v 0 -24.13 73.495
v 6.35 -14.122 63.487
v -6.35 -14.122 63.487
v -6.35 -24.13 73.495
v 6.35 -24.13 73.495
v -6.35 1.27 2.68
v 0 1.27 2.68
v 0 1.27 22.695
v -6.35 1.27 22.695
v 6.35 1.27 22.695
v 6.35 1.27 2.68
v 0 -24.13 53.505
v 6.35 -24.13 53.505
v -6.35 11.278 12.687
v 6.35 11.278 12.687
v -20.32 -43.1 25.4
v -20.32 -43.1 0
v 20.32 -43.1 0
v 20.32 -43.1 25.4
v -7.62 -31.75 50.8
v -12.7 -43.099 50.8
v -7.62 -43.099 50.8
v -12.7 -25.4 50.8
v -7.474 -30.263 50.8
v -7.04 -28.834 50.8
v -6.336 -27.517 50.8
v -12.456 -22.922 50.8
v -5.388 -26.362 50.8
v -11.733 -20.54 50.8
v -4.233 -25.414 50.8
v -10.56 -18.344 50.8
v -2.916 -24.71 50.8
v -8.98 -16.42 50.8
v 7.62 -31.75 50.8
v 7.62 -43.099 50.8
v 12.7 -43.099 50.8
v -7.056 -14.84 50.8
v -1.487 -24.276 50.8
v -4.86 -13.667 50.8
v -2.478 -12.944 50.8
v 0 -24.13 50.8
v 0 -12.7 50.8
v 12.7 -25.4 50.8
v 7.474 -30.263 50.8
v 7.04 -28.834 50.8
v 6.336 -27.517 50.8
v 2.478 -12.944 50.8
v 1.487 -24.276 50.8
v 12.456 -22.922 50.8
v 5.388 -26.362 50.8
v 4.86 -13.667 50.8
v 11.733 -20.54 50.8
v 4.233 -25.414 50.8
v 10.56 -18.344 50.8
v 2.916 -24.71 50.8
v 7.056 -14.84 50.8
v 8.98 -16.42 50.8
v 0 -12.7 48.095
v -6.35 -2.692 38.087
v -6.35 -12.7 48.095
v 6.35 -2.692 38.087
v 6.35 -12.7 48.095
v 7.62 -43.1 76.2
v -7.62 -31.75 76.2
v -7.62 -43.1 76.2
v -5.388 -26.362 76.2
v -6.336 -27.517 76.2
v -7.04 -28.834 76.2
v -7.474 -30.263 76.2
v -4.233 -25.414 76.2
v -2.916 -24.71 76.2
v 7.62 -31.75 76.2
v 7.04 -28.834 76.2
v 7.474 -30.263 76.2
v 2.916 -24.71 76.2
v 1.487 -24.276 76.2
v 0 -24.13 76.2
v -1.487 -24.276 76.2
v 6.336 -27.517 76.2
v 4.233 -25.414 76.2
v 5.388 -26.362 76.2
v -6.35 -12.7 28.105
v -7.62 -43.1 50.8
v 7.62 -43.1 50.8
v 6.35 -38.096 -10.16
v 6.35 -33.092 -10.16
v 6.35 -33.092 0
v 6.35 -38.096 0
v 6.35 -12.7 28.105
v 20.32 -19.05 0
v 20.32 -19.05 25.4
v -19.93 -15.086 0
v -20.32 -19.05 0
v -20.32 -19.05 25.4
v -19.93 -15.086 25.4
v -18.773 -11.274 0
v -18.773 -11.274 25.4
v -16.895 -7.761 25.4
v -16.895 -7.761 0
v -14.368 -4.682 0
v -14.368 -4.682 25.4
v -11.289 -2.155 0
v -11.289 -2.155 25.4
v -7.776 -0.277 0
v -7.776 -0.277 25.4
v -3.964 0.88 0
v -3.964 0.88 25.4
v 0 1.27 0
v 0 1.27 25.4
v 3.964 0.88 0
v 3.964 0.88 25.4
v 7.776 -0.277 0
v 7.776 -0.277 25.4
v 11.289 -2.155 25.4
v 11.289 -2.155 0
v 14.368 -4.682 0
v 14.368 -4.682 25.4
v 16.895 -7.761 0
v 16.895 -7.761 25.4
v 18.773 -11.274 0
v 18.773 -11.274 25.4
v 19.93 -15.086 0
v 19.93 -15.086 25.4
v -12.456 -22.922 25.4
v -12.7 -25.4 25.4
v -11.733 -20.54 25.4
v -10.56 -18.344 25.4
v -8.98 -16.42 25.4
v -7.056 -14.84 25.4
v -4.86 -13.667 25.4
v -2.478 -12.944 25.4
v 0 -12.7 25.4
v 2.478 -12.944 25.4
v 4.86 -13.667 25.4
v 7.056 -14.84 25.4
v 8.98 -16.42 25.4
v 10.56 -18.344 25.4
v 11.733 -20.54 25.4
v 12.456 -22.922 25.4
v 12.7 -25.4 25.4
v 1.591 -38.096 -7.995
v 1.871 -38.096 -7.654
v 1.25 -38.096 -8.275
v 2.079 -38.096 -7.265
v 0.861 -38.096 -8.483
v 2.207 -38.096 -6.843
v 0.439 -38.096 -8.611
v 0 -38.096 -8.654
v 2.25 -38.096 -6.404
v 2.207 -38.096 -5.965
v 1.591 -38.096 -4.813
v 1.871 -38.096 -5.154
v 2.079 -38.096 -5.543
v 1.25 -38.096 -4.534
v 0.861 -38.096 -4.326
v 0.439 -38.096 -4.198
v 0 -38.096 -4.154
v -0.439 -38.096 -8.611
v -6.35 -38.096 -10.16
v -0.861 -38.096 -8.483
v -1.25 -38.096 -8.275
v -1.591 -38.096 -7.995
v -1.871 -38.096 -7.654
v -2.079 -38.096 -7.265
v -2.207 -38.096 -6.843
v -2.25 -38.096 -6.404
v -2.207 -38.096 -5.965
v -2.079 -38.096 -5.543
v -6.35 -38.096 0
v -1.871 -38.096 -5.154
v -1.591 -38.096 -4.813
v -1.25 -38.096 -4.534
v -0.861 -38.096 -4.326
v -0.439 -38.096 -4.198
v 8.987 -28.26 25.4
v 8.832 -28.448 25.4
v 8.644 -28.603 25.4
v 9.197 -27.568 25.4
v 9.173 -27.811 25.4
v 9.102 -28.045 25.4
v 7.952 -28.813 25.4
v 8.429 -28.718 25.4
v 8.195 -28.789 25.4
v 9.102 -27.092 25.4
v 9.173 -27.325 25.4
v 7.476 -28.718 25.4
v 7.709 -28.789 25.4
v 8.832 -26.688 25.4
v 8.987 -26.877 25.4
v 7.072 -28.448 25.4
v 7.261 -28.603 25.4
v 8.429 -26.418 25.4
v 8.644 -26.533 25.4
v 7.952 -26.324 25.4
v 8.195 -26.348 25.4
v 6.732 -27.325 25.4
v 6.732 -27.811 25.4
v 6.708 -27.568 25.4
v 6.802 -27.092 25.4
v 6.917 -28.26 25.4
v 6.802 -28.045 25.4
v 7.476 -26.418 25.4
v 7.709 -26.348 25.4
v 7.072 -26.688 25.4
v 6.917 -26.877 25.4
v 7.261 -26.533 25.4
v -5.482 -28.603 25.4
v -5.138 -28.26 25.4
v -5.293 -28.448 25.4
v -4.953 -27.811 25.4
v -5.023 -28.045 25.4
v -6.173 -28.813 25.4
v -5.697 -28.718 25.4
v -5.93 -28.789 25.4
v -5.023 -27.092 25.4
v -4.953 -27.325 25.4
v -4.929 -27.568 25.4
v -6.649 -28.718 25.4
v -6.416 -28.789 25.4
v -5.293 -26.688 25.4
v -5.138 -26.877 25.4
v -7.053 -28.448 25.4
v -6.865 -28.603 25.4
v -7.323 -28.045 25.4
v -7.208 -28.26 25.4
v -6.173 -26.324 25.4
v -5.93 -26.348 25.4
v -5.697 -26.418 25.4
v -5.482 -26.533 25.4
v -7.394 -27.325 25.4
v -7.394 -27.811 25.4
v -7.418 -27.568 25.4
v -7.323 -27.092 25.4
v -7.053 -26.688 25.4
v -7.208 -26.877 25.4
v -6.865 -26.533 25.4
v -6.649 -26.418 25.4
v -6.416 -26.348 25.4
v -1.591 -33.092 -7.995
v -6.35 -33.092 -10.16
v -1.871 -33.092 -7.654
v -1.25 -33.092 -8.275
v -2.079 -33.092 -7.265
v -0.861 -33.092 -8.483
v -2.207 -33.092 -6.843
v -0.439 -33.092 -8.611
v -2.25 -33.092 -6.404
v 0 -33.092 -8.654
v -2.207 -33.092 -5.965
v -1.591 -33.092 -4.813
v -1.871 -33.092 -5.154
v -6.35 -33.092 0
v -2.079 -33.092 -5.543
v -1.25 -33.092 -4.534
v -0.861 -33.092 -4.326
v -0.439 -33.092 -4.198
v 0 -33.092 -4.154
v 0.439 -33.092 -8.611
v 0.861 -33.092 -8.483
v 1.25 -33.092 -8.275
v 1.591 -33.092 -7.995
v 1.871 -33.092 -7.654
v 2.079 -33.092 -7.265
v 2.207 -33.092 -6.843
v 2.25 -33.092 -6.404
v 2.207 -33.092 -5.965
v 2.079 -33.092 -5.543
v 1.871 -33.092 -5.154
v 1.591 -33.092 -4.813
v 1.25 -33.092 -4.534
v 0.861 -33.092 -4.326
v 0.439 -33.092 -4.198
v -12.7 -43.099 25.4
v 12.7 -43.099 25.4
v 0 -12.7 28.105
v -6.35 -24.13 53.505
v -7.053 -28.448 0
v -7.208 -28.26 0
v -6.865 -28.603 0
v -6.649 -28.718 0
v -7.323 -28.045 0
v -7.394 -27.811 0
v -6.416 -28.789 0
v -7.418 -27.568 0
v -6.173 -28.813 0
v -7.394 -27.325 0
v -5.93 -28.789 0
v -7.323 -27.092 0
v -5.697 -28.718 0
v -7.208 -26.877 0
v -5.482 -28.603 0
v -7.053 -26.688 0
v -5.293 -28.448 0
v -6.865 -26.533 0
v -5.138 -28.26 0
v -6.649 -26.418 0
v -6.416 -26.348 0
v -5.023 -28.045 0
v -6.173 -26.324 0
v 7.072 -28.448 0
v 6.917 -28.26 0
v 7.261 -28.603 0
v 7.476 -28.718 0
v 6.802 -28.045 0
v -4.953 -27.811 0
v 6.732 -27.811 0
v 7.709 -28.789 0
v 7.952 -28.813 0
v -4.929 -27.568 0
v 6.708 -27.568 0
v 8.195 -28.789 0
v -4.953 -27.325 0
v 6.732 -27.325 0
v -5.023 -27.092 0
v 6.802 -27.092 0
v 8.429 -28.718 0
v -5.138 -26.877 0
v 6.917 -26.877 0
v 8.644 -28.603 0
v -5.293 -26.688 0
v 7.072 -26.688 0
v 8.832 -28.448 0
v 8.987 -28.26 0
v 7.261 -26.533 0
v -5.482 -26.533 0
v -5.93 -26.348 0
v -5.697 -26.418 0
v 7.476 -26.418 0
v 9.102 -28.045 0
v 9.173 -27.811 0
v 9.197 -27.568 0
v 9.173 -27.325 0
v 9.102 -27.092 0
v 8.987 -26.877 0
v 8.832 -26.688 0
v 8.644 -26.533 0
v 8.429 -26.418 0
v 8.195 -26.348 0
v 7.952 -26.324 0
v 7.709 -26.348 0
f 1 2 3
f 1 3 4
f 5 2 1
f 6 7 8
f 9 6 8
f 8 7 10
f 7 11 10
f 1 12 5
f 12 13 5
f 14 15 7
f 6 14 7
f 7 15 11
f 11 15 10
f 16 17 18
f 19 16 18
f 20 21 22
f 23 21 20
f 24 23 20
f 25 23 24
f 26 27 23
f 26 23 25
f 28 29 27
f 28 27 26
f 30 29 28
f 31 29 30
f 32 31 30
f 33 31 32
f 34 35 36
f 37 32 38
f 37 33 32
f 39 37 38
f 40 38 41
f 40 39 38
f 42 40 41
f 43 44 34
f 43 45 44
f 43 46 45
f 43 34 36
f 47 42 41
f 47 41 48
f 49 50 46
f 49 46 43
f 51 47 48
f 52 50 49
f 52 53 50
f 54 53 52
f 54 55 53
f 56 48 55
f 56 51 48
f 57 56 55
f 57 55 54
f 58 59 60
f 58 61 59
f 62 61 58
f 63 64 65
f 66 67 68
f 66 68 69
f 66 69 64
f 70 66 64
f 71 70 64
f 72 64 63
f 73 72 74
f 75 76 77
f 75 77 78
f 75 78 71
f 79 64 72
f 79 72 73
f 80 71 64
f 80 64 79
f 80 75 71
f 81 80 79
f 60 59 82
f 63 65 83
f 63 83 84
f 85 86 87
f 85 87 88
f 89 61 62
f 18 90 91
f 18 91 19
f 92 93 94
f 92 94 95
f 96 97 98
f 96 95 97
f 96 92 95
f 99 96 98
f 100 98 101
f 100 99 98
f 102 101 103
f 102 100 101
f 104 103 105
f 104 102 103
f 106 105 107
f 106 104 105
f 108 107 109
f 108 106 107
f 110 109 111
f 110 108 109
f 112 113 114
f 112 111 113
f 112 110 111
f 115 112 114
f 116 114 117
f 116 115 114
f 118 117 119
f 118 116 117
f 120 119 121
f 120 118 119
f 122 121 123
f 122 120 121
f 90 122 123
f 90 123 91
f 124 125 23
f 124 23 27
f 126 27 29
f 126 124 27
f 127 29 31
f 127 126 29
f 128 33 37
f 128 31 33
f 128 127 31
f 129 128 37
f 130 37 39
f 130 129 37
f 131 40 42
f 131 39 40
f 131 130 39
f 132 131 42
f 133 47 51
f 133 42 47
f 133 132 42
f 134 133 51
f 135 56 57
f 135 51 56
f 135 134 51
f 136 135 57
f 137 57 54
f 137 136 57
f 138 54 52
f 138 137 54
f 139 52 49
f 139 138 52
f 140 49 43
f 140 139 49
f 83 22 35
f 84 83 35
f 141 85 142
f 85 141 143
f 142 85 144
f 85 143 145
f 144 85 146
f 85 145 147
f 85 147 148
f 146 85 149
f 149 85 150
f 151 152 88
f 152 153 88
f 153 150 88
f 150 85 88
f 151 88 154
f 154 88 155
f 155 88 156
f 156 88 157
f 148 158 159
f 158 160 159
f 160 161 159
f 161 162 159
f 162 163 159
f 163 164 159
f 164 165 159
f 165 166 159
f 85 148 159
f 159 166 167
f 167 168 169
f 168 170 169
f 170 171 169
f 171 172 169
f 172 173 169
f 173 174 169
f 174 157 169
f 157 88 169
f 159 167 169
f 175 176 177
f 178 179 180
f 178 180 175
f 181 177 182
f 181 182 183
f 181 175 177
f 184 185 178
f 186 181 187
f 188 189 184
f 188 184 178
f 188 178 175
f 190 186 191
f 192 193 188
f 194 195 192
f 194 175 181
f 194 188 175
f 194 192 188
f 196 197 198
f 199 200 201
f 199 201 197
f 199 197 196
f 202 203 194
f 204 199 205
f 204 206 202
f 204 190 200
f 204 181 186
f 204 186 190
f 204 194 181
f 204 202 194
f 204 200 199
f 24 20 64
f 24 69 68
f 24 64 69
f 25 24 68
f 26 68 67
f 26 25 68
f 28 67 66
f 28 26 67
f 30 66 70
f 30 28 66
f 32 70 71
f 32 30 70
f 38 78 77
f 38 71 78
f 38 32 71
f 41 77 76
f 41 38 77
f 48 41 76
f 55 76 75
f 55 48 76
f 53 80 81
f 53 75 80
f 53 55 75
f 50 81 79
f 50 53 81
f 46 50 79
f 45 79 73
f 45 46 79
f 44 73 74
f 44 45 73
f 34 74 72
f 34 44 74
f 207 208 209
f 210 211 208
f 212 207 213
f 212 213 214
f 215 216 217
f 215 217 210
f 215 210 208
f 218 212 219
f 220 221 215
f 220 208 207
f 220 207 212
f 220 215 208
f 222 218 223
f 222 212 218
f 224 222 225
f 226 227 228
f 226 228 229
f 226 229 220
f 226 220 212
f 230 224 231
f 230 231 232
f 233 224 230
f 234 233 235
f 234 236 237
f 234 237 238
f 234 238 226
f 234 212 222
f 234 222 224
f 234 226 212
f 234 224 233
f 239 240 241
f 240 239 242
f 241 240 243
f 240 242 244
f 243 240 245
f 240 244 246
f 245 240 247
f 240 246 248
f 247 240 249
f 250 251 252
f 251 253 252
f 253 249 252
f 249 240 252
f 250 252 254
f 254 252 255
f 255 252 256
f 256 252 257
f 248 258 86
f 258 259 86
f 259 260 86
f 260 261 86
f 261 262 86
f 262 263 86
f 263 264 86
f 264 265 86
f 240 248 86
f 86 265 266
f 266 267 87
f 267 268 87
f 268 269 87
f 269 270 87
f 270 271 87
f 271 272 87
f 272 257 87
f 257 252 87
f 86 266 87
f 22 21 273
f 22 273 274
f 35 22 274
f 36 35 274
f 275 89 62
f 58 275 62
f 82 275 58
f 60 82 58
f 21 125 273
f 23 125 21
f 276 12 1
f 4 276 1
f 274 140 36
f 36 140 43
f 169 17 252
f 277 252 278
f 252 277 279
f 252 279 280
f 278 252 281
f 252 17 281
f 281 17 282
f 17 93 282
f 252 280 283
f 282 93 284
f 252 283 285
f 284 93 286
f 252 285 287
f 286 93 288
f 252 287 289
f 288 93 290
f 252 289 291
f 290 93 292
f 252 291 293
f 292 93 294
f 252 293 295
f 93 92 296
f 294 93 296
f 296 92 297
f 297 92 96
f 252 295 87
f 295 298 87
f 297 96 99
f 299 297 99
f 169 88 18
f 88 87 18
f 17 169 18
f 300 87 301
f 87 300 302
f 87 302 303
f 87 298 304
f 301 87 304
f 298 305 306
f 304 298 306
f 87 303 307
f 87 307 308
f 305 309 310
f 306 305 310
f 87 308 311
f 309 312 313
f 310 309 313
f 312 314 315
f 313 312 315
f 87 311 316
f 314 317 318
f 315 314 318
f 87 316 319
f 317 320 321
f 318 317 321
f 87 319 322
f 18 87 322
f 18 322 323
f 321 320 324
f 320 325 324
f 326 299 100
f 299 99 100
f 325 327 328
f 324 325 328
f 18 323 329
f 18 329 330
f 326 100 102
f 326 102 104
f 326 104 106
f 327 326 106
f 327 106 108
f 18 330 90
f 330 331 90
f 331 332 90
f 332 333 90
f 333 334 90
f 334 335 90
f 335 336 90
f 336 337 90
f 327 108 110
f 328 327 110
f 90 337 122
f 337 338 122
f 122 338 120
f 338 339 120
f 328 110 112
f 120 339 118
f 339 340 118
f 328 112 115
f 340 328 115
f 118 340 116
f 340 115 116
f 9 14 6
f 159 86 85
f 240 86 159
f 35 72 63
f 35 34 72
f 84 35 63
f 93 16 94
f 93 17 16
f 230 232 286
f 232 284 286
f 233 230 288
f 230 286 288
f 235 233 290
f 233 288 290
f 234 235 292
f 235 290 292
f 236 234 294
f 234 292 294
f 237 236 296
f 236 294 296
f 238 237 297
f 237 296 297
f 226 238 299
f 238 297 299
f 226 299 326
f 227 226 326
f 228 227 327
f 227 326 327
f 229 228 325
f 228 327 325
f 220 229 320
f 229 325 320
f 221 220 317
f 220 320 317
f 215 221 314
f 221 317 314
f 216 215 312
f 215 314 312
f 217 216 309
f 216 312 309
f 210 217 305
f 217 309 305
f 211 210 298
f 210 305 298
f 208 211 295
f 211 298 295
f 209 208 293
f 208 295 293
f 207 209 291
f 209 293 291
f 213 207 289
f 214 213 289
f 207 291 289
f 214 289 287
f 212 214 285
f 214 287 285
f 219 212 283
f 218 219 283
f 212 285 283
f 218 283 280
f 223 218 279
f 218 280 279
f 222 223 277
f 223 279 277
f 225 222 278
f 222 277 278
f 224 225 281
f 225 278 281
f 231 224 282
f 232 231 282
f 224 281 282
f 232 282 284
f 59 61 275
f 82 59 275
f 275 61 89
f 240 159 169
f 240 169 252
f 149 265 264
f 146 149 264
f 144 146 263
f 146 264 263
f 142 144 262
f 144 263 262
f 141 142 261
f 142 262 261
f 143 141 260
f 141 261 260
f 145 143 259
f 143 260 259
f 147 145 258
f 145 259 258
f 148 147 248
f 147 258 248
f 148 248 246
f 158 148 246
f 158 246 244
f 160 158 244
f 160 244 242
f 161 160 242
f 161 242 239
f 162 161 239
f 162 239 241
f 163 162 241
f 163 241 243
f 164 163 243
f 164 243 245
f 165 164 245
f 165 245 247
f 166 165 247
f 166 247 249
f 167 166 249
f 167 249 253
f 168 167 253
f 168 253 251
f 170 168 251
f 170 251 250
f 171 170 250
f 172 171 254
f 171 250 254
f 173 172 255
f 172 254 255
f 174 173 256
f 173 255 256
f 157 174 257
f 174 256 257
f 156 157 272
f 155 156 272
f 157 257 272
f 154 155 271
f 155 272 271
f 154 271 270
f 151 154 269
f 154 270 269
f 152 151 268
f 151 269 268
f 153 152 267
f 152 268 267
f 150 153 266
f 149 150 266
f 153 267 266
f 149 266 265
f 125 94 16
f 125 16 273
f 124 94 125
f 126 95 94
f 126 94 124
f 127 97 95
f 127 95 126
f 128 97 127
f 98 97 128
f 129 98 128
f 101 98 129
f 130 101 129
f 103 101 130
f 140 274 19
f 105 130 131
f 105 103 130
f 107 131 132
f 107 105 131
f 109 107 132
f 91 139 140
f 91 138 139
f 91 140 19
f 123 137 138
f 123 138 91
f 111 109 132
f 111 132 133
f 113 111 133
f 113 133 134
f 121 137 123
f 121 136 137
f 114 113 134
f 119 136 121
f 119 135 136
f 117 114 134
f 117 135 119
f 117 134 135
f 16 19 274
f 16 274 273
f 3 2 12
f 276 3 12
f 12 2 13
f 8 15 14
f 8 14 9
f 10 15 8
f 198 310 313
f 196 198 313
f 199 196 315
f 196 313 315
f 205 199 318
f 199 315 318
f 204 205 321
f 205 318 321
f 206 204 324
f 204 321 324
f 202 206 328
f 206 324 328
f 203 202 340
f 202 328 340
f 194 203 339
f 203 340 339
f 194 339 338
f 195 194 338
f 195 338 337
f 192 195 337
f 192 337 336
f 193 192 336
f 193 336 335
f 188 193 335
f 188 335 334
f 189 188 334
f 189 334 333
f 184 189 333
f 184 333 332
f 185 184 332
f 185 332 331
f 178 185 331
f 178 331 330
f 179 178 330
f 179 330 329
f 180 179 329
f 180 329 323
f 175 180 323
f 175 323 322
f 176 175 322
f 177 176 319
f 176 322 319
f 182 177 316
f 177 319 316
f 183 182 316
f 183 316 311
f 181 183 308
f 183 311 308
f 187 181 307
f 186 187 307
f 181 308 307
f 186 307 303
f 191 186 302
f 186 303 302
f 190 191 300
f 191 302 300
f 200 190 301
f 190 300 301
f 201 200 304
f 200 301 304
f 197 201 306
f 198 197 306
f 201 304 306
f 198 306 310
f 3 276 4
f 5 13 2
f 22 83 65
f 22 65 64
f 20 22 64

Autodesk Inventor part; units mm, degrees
ref_plane "YZ Plane" through (0, 0, 0) normal (1, 0, 0) x (0, 1, 0)
ref_plane "XZ Plane" through (0, 0, 0) normal (0, 1, 0) x (-1, 0, 0)
sketch "Sketch1" plane through (0, 0, 0) normal (0, 0, 1) x (1, 0, 0)
  line L0 (6.35, -38.0962) -> (6.35, -43.1) projected
  line L1 (6.35, -43.1) -> (24.13, -43.1) projected
  line L2 (24.13, -43.1) -> (24.13, 0) projected
  arc A0 (24.13, 0) -> (-24.13, 0) centre (0, 0) ccw projected
  line L3 (-24.13, 0) -> (-24.13, -43.1) projected
  line L4 (-24.13, -43.1) -> (-6.35, -43.1) projected
  line L5 (-6.35, -43.1) -> (-6.35, -38.0962) projected
  line L6 (-6.35, -38.0962) -> (6.35, -38.0962) projected
  line L7 (20.32, -43.1) -> (-20.32, -43.1)
  line L8 (0, 0) -> (0, -19.05)
  circle A1 centre (0, -19.05) radius 20.32
  line L9 (-20.32, -19.05) -> (20.32, -19.05)
  line L10 (20.32, -19.05) -> (20.32, -43.1)
  line L11 (20.32, -43.1) -> (-20.32, -43.1)
  line L12 (-20.32, -43.1) -> (-20.32, -19.05)
  dimension "d26" = 40.64
  dimension "d25" = 19.05
extrude "Extrusion1" add sketch "Sketch1" along normal blind 25.4 contours L6 L5 A1 L9 L0 | L0 A1 L5 L6 | A1 L10 L1 L0 | L0 L7 L5 A1 | L5 L4 L12 A1 | L9 A1
sketch "Sketch2" plane through (0, 0, 0) normal (0, 0, -1) x (-1, 0, 0)
  line L0 (6.35, -43.1) -> (-6.35, -43.1) projected
  line L1 (-6.35, -43.1) -> (-6.35, -38.0962) projected
  line L2 (-6.35, -38.0962) -> (6.35, -38.0962) projected
  line L3 (6.35, -38.0962) -> (6.35, -43.1) projected
  line L4 (-6.35, -38.0962) -> (6.35, -38.0962)
  line L5 (6.35, -38.0962) -> (6.35, -33.0924)
  line L6 (6.35, -33.0924) -> (-6.35, -33.0924)
  line L7 (-6.35, -33.0924) -> (-6.35, -38.0962)
  point P0 (0, 0)
  dimension "d3" = 5.0038
extrude "Extrusion2" add sketch "Sketch2" along normal blind 10.16 contours L2 L7 L6 L5
sketch "Sketch3" plane through (-6.35, -33.0924, 0) normal (0, 1, 0) x (1, 0, 0)
  line L0 (6.35, 10.2144) -> (6.35, 6.4044)
  circle A0 centre (6.35, 6.4044) radius 2.25
  point P0 (6.35, 0)
  dimension "d6" = 3.81
  dimension "d7" = 4.5
extrude "Extrusion3" cut sketch "Sketch3" against normal blind 10.16
sketch "Sketch4" plane through (0, 0, 25.4) normal (0, 0, 1) x (1, 0, 0)
  arc A0 (20.32, -19.05) -> (-20.32, -19.05) centre (0, -19.05) ccw projected
  line L0 (0, -19.05) -> (0, -25.4)
  circle A1 centre (0, -25.4) radius 12.7
  line L1 (-12.7, -25.4) -> (12.7, -25.4)
  line L2 (12.7, -25.4) -> (12.7, -42.8987)
  line L3 (12.7, -42.8987) -> (-12.7, -42.8987)
  line L4 (-12.7, -42.8987) -> (-12.7, -25.4)
  point P0 (0, 0)
  dimension "d28" = 25.4
  dimension "d27" = 6.35
extrude "Extrusion4" add sketch "Sketch4" along normal blind 25.4
sketch "Sketch5" plane through (0, 0, 50.8) normal (0, 0, 1) x (1, 0, 0)
  arc A0 (12.7, -25.4) -> (-12.7, -25.4) centre (0, -25.4) ccw projected
  line L0 (0, -25.4) -> (0, -31.75)
  circle A1 centre (0, -31.75) radius 7.62
  line L1 (-20.32, -43.1) -> (20.32, -43.1) projected
  line L2 (-7.62, -31.75) -> (7.62, -31.75)
  line L3 (7.62, -31.75) -> (7.62, -43.1)
  line L4 (7.62, -43.1) -> (-7.62, -43.1)
  line L5 (-7.62, -43.1) -> (-7.62, -31.75)
  point P0 (0, 0)
  dimension "d30" = 15.24
  dimension "d29" = 6.35
extrude "Extrusion5" add sketch "Sketch5" along normal blind 25.4
ref_plane "Work Plane1" through (0, -43.1, 0) normal (-1, 0, 0) x (0, 0, 1)
sketch "Sketch8" plane through (0, -43.1, 0) normal (-1, 0, 0) x (0, 0, 1)
  line L0 (0, 44.37) -> (0, 24.05) projected
  line L1 (0, 44.37) -> (2.7051, 44.37)
  line L2 (0, 44.37) -> (25.4, 44.37) projected
  line L3 (2.7051, 44.37) -> (22.6949, 44.37)
  line L4 (22.6949, 44.37) -> (12.6873, 44.37)
  line L5 (12.6873, 44.37) -> (12.6873, 54.3776)
  line L6 (12.6873, 54.3776) -> (22.6949, 44.37)
  line L7 (12.6873, 54.3776) -> (2.6797, 44.37)
  line L8 (12.6873, 54.3776) -> (2.6797, 44.37)
  line L9 (2.6797, 44.37) -> (22.6949, 44.37)
  point P0 (0, 43.1)
  dimension "d32" = 2.7051
  dimension "d33" = 19.9898
  dimension "d34" = 10.0076
  dimension "d35" = 10.0076
extrude "Extrusion8" add sketch "Sketch8" along normal mid plane 12.7
sketch "Sketch9" plane through (0, -43.1, 0) normal (-1, 0, 0) x (0, 0, 1)
  line L0 (25.4, 30.4) -> (50.8, 30.4) projected
  line L1 (25.4, 30.4) -> (28.1051, 30.4)
  line L2 (28.1051, 30.4) -> (48.0949, 30.4)
  line L3 (48.0949, 30.4) -> (38.0873, 30.4)
  line L4 (38.0873, 30.4) -> (38.0873, 40.4076)
  line L5 (38.0873, 40.4076) -> (48.0949, 30.4)
  line L6 (38.0873, 40.4076) -> (28.1051, 30.4)
  point P0 (0, 43.1)
  dimension "d38" = 2.7051
  dimension "d39" = 19.9898
  dimension "d40" = 10.0076
  dimension "d41" = 10.0076
extrude "Extrusion9" add sketch "Sketch9" along normal mid plane 12.7
sketch "Sketch10" plane through (0, -43.1, 0) normal (-1, 0, 0) x (0, 0, 1)
  line L0 (50.8, 18.97) -> (76.2, 18.97) projected
  line L1 (50.8, 18.97) -> (53.5051, 18.97)
  line L2 (53.5051, 18.97) -> (73.4949, 18.97)
  line L3 (73.4949, 18.97) -> (63.4873, 18.97)
  line L4 (63.4873, 18.97) -> (63.4873, 28.9776)
  line L5 (63.4873, 28.9776) -> (73.4949, 18.97)
  line L6 (63.4873, 28.9776) -> (53.5051, 18.97)
  point P0 (0, 43.1)
  dimension "d44" = 2.7051
  dimension "d45" = 19.9898
  dimension "d46" = 10.0076
  dimension "d47" = 10.0076
extrude "Extrusion10" add sketch "Sketch10" along normal mid plane 12.7
sketch "Sketch11" plane through (-12.7, -42.8987, 25.4) normal (0, -1, 0) x (1, 0, 0)
  line L0 (25.4, 0) -> (0, 0) projected
  line L1 (25.4, 0) -> (25.4, 25.4) projected
  line L2 (20.32, 25.4) -> (25.4, 25.4) projected
  line L3 (5.08, 25.4) -> (20.32, 25.4) projected
  line L4 (0, 25.4) -> (5.08, 25.4) projected
  line L5 (0, 0) -> (0, 25.4) projected
  point P0 (12.7, -25.4)
extrude "Extrusion11" add sketch "Sketch11" along normal blind 0.2
sketch "Sketch12" plane through (0, 0, 0) normal (0, 0, -1) x (-1, 0, 0)
  ellipse E0 centre (-8.9523, -27.5683) end of major axis (-8.9523, -28.8129) minor radius 1.2444 projected
  ellipse E1 centre (7.1732, -27.5683) end of major axis (7.1732, -28.8129) minor radius 1.2444 projected
  line L0 (-8.9523, -27.5683) -> (-7.9523, -27.5683)
  line L1 (7.1732, -27.5683) -> (6.1732, -27.5683)
  circle A0 centre (-7.9523, -27.5683) radius 1.2446
  circle A1 centre (6.1732, -27.5683) radius 1.2446
  point P0 (0, 0)
  dimension "d52" = 1
  dimension "d53" = 1
  dimension "d54" = 2.4892
  dimension "d55" = 2.4892
extrude "Extrusion12" cut sketch "Sketch12" against normal blind 25.4 contours A0 E0 | E0 A0 | A1 E1 | E1 A1 picked at (-8.6972, -27.743) picked at (-7.0538, -27.6701) picked at (6.9181, -27.3936) picked at (5.2747, -27.4665)
properties part number "Tail6"
